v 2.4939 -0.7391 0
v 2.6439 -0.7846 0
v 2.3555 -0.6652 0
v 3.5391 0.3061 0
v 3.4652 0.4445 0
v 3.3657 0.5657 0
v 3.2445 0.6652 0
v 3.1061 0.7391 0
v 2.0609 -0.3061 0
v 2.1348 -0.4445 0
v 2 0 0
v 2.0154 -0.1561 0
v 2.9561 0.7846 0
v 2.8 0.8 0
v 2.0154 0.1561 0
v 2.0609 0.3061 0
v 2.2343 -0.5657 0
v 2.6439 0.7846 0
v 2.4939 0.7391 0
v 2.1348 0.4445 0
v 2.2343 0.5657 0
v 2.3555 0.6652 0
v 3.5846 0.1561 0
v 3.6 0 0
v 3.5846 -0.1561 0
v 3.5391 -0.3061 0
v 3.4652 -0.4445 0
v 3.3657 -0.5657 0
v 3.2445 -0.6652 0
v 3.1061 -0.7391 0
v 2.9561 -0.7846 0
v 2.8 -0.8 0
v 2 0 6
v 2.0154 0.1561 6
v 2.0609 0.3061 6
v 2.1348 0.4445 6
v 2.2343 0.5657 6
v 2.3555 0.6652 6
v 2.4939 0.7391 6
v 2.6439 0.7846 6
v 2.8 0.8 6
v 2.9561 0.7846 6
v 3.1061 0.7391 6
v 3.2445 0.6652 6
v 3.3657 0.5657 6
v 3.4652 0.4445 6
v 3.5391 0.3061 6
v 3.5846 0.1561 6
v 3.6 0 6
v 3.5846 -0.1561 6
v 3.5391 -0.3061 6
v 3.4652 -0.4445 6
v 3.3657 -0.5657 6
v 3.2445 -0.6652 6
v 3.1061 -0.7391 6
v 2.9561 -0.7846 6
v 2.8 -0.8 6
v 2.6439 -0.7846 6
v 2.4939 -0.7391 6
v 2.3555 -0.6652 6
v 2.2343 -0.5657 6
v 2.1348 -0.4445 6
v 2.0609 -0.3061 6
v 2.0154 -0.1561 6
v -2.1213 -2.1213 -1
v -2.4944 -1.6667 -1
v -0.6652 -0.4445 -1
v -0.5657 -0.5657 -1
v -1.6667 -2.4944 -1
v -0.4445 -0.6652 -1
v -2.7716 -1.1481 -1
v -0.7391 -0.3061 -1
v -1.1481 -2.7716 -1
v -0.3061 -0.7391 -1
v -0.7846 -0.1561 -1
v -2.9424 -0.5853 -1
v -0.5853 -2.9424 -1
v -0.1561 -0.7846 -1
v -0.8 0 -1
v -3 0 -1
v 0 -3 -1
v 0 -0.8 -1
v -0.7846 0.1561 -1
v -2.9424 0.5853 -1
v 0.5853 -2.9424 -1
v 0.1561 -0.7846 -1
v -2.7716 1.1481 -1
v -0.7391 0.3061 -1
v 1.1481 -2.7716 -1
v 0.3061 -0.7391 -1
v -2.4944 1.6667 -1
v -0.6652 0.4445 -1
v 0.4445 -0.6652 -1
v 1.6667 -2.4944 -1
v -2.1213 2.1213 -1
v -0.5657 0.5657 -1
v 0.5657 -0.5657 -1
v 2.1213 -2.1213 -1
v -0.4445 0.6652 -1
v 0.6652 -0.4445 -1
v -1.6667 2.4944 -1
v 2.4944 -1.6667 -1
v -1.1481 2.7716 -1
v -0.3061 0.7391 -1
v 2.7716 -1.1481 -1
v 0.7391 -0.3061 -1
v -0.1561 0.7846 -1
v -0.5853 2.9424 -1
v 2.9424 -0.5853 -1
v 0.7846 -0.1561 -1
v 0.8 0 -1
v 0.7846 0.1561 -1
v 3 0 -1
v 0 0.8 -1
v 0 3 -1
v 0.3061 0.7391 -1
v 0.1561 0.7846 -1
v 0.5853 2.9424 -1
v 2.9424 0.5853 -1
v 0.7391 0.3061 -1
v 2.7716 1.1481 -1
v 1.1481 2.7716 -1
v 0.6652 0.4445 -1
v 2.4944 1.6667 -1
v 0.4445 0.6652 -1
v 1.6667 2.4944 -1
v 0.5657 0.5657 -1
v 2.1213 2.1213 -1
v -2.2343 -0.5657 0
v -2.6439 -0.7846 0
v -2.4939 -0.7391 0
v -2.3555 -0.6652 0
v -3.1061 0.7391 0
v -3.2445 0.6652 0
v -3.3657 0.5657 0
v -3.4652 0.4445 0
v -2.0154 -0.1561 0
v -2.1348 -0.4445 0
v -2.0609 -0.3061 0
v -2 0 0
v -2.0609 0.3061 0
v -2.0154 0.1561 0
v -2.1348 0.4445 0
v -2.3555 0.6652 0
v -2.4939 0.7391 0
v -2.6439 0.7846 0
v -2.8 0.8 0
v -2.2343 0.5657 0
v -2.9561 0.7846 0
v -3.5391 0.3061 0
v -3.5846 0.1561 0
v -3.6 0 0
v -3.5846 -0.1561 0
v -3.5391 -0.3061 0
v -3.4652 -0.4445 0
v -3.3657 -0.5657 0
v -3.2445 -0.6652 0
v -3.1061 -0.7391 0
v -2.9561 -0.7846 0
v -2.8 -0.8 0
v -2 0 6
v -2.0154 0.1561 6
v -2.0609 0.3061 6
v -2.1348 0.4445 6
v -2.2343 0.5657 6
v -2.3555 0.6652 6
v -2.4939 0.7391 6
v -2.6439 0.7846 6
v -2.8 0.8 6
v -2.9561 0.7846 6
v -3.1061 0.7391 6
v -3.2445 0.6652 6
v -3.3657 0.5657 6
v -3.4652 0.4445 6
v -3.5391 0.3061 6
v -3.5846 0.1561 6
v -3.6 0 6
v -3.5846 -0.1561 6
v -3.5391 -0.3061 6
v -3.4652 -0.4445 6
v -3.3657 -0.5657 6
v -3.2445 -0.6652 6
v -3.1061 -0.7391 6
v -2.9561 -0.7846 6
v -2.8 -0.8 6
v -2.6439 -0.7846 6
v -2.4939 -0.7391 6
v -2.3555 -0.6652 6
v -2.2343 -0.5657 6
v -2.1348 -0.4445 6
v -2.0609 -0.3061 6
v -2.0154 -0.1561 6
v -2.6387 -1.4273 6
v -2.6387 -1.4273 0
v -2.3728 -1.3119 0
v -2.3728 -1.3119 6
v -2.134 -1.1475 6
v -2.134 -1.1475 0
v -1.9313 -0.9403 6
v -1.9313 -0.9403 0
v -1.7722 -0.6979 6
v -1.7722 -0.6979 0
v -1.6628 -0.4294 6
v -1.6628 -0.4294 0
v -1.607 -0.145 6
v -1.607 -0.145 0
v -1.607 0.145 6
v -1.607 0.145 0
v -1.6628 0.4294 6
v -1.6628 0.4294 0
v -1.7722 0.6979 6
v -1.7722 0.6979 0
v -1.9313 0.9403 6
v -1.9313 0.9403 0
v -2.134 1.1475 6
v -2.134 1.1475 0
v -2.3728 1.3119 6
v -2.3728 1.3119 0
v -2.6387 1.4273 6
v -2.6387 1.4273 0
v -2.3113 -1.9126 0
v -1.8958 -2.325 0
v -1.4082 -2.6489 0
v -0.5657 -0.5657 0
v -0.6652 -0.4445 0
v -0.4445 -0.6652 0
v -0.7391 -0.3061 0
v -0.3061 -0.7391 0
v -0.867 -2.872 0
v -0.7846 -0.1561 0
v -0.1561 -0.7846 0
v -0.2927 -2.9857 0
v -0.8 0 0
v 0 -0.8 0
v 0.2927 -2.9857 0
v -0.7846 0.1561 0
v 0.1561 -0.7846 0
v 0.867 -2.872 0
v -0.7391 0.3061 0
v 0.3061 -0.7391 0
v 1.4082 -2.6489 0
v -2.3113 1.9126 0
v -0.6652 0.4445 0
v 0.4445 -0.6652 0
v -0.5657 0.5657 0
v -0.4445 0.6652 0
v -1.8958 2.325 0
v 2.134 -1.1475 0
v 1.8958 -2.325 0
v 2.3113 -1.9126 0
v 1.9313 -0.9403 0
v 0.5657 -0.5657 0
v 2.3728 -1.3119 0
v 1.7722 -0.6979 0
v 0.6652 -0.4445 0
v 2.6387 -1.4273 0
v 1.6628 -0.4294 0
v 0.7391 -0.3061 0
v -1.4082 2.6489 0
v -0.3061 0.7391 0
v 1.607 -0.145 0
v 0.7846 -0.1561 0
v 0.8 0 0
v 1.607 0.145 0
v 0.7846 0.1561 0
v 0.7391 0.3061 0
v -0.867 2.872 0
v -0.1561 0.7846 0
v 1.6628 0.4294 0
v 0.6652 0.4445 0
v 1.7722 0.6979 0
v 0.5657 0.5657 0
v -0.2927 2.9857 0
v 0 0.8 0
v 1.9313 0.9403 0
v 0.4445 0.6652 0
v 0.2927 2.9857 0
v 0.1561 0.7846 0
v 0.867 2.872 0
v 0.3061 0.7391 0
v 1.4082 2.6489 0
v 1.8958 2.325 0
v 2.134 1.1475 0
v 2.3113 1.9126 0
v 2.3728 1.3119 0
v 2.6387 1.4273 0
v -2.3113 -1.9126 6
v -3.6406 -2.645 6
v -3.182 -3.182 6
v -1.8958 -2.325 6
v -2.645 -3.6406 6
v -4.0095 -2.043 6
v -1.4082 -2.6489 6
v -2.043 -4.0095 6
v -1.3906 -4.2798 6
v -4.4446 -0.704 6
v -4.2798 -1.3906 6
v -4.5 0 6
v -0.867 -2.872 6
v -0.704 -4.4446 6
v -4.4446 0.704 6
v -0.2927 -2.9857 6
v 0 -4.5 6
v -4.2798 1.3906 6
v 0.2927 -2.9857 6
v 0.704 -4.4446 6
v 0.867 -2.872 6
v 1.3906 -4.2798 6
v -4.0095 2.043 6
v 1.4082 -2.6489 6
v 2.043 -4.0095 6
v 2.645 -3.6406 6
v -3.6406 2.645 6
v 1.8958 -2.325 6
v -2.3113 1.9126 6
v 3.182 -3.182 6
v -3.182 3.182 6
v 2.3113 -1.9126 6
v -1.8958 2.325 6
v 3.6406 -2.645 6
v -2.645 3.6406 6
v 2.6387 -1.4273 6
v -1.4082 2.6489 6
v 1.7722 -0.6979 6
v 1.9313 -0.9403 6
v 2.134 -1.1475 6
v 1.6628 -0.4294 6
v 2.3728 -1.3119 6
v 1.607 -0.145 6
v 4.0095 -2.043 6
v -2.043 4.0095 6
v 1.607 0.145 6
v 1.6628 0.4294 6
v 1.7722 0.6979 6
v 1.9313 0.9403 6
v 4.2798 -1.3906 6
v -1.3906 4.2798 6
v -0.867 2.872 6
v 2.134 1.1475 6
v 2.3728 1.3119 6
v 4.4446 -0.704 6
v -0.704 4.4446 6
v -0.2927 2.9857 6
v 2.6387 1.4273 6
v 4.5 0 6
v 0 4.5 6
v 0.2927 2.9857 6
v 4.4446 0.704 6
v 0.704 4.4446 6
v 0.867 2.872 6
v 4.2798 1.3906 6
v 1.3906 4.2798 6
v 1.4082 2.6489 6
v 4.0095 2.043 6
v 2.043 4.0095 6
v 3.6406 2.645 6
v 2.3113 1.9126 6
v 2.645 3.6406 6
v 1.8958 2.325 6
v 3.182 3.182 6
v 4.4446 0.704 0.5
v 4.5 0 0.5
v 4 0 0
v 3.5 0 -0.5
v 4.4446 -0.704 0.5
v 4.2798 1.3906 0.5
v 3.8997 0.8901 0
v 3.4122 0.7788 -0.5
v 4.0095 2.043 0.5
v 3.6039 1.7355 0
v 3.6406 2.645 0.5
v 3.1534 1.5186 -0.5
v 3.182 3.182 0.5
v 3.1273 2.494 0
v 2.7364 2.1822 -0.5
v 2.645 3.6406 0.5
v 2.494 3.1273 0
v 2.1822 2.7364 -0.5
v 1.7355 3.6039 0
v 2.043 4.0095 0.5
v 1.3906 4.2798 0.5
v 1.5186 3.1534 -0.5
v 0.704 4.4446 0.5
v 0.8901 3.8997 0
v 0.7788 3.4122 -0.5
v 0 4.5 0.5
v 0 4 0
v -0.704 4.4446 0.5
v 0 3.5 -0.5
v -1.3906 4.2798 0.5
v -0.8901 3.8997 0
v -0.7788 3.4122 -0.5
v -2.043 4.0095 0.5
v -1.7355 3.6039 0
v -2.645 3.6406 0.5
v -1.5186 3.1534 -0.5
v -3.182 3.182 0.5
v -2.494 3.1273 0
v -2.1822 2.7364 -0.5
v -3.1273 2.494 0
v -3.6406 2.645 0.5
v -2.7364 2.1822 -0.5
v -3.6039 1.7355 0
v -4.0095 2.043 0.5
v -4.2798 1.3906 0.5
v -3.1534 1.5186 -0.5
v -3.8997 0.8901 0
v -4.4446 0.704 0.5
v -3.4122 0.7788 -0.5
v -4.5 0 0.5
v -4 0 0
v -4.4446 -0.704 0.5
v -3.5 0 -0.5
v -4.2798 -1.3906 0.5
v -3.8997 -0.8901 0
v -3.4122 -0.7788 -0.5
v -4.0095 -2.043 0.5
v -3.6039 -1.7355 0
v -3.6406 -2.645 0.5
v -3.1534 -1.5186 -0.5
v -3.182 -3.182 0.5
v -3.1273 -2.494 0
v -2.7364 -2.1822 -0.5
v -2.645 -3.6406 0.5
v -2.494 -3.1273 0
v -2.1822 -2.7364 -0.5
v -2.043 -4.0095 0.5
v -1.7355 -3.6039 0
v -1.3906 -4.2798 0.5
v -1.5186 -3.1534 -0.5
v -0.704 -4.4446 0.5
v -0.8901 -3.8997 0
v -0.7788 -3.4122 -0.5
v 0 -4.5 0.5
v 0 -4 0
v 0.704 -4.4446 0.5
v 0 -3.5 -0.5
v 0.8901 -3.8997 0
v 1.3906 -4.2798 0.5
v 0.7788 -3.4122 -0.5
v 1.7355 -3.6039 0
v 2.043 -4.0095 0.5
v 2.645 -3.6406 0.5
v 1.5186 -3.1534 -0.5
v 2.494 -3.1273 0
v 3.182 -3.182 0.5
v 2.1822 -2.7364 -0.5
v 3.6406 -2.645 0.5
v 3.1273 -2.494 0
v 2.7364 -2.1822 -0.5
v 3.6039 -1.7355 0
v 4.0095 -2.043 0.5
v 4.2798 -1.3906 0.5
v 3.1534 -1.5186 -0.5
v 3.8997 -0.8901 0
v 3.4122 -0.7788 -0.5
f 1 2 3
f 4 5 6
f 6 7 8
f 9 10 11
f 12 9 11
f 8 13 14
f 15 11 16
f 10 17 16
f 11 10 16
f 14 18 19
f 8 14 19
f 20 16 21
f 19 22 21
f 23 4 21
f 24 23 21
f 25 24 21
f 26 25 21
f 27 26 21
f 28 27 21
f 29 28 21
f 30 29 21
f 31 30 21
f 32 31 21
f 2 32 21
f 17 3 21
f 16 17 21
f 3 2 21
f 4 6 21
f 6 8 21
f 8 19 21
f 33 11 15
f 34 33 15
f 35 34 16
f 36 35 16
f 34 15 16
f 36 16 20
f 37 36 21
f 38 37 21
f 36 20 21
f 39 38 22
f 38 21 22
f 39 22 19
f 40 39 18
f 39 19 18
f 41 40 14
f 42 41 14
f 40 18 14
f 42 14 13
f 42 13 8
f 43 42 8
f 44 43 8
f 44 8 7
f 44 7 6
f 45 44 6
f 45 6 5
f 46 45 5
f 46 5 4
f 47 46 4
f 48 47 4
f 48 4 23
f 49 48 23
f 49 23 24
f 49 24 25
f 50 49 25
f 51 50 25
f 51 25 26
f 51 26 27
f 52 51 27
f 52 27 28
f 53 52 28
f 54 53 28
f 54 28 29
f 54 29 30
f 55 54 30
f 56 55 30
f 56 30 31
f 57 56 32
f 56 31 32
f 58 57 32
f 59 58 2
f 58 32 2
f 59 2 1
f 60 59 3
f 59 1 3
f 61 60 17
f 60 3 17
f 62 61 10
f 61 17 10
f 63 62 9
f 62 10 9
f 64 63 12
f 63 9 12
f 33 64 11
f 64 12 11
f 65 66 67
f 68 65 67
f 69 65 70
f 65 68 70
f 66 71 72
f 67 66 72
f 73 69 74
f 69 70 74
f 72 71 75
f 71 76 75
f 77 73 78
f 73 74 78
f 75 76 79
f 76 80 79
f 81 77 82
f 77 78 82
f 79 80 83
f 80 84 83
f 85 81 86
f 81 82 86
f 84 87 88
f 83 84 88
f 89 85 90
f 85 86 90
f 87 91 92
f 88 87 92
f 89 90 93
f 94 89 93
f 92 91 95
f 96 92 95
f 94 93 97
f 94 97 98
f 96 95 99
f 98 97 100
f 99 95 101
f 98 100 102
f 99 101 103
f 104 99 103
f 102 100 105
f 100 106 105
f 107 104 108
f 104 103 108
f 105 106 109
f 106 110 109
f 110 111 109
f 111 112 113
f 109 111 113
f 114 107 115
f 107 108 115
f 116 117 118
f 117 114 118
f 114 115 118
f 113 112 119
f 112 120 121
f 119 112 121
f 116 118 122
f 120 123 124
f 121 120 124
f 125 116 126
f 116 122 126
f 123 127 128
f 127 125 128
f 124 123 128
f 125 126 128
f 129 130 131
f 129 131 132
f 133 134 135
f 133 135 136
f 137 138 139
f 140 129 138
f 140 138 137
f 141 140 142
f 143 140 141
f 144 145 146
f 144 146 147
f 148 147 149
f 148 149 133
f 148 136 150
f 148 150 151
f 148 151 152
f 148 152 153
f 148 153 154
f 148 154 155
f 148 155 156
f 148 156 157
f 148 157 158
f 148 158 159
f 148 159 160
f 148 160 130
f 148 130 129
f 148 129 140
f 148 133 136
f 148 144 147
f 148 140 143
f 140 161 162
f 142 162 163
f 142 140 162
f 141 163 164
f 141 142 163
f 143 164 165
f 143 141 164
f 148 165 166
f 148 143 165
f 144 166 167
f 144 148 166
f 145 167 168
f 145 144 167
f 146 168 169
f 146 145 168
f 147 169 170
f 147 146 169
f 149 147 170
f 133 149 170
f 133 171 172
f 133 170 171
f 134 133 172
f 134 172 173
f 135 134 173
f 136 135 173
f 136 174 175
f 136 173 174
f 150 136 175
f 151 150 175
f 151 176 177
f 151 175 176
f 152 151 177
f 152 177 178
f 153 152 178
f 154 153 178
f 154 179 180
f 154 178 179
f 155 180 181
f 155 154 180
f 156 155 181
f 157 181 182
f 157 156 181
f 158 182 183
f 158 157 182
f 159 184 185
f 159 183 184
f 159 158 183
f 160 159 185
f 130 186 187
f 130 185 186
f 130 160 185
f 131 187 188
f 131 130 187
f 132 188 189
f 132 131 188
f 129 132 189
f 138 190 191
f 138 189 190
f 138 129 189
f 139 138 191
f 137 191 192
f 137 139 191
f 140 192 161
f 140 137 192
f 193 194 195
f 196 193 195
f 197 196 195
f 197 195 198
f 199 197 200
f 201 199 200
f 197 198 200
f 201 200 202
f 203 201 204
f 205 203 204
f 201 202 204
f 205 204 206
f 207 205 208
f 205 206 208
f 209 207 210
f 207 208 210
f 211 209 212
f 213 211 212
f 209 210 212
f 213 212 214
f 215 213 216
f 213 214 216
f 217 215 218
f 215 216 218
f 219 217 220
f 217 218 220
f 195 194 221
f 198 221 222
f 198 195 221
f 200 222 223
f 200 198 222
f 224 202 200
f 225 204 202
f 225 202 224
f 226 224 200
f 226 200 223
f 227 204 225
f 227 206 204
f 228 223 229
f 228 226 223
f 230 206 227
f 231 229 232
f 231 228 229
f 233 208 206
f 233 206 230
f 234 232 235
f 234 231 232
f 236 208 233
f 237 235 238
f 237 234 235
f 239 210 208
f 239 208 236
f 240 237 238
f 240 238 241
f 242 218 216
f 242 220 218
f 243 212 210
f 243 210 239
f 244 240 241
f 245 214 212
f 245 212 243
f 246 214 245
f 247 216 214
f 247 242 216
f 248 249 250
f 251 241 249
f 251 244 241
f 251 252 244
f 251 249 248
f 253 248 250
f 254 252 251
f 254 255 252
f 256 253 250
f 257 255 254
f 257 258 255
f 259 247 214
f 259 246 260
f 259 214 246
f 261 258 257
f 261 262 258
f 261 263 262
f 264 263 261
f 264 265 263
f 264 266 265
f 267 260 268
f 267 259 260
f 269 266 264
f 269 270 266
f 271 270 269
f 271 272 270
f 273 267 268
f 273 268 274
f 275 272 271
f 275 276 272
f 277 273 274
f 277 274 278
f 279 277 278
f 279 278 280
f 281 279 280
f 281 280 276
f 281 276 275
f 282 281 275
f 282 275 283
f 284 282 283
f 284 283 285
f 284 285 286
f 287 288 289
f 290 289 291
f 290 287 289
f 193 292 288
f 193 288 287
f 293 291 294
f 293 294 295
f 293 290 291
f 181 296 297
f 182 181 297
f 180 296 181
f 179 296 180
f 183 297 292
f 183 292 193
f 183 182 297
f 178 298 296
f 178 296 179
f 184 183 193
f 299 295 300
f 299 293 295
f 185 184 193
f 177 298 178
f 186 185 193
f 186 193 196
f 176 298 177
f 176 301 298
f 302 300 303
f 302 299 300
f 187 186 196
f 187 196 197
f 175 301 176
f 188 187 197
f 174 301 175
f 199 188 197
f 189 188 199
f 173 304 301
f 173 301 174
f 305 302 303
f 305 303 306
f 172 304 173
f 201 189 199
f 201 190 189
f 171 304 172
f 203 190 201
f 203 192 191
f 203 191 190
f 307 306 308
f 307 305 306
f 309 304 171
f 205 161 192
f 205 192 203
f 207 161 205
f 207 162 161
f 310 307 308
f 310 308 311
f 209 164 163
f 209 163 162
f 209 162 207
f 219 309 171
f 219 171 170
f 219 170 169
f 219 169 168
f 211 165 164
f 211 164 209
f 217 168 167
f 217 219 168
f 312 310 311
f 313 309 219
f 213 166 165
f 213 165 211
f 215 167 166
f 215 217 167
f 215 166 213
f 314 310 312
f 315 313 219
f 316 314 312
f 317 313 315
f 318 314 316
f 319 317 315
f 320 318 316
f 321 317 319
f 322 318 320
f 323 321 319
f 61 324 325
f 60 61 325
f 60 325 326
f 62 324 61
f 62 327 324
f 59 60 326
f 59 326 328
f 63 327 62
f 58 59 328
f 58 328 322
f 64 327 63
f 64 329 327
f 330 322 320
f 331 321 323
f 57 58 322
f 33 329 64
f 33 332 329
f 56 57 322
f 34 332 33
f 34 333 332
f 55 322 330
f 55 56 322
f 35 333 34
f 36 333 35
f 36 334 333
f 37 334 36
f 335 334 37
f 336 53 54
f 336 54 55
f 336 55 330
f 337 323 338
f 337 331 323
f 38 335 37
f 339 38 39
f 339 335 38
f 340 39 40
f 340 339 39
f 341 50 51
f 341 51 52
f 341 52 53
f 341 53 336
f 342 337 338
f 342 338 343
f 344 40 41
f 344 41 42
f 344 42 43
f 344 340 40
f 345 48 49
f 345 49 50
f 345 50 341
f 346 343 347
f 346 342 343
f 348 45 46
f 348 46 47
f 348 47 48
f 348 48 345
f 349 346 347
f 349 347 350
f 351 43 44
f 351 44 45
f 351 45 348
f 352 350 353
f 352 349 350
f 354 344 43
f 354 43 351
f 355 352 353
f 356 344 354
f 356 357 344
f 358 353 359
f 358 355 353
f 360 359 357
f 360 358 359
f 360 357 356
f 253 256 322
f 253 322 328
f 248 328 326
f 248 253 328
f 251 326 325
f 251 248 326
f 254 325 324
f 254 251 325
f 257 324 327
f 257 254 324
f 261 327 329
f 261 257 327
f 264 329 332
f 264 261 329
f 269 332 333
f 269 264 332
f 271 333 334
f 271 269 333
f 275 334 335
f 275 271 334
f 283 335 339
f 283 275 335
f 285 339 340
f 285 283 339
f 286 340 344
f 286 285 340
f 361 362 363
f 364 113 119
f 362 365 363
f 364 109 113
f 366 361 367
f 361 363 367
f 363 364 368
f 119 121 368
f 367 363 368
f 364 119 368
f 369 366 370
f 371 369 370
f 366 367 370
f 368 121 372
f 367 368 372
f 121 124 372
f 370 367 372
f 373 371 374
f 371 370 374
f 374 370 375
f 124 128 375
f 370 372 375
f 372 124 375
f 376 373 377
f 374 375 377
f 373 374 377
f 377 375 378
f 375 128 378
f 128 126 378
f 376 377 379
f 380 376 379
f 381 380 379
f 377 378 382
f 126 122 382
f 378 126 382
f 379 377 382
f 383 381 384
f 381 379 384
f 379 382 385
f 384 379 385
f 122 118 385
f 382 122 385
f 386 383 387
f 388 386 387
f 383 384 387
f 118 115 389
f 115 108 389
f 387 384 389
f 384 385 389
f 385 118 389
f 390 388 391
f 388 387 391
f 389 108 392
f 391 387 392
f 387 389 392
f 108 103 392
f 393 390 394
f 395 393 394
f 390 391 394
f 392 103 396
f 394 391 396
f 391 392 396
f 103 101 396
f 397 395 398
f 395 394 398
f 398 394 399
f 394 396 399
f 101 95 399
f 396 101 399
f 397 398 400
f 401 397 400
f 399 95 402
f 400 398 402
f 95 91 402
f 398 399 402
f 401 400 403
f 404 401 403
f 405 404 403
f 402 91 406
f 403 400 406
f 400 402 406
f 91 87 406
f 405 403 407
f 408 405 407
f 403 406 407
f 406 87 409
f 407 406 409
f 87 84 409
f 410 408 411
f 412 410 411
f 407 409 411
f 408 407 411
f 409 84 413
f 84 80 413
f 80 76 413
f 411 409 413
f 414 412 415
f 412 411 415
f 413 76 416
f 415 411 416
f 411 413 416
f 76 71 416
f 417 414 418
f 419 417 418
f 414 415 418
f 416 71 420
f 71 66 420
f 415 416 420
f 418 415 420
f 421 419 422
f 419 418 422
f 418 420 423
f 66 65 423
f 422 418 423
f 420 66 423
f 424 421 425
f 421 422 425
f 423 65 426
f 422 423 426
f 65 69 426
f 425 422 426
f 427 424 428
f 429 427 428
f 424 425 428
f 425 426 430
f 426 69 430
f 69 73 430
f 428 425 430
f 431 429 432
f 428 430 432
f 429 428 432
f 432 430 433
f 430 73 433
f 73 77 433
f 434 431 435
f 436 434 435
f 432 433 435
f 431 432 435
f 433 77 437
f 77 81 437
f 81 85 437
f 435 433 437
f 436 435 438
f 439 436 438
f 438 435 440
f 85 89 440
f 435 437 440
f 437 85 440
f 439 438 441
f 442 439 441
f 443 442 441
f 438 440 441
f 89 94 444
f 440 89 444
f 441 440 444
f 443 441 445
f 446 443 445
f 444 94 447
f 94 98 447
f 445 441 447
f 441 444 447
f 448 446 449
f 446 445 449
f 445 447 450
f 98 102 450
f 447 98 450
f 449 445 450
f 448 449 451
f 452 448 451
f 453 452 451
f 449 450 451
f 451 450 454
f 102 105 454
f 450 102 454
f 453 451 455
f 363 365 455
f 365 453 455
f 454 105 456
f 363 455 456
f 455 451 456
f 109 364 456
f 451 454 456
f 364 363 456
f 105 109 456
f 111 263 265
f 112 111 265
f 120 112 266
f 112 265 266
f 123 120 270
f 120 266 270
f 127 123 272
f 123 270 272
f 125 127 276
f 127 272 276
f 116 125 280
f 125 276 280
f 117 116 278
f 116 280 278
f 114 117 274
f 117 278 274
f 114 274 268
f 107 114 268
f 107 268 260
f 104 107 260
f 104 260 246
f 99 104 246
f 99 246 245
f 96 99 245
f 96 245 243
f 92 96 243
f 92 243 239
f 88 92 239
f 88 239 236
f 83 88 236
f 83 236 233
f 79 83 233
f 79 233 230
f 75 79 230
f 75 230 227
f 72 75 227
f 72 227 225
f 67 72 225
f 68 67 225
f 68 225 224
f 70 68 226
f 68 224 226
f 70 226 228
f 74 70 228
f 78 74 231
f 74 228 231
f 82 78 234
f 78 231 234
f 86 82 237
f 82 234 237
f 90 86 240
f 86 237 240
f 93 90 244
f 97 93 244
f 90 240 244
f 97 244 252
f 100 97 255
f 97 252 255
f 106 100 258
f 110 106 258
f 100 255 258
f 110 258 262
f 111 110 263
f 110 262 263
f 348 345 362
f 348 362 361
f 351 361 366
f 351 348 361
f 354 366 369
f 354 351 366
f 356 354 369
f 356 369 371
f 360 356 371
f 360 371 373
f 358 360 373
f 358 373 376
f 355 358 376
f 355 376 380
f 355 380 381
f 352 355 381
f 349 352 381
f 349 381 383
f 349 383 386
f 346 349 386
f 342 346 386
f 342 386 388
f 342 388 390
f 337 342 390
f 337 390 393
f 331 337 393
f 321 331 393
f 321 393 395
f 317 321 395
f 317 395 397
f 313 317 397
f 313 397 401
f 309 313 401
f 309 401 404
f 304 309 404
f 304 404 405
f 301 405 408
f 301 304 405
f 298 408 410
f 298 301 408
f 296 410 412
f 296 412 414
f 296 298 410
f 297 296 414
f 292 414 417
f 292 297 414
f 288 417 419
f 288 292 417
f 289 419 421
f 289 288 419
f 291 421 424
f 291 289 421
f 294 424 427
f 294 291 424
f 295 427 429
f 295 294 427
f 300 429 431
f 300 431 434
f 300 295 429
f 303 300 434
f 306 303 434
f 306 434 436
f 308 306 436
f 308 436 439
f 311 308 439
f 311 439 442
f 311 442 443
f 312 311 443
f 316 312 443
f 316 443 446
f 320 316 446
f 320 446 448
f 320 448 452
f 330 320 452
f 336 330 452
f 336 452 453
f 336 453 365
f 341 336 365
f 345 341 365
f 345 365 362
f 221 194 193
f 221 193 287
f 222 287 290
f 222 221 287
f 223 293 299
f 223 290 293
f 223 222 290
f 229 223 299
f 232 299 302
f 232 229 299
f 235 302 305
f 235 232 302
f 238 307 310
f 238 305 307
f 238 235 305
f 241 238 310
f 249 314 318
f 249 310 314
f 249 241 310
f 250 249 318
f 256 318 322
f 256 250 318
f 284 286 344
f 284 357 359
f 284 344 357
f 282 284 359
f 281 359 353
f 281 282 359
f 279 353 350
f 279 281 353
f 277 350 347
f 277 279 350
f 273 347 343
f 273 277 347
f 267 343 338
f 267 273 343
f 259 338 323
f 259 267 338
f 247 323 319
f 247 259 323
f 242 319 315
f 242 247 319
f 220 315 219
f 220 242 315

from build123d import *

# Parameters (mm, degrees)
SKETCH006_R       = 4.5
PAD002_DEPTH      = 6
PAD002_DEPTH_BACK = 1
SKETCH007_R       = 3
POCKET008_DEPTH   = 6
SKETCH008_R       = 0.8
HOLE_DEPTH        = 25
PAD005_DEPTH      = 6
SKETCH010_R       = 0.8
POCKET005_DEPTH   = 7
CHAMFER_SIZE      = 1.5


with BuildPart() as part:
    # Sketch006 → Pad002 (new body, two sides)
    with BuildSketch(Plane.XY) as pad002_sk:
        Circle(SKETCH006_R)
    extrude(amount=PAD002_DEPTH)
    extrude(pad002_sk.sketch, amount=-PAD002_DEPTH_BACK)

    # Sketch007 → Pocket008 (cut)
    with BuildSketch(Plane.XY):
        Circle(SKETCH007_R)
    extrude(amount=POCKET008_DEPTH, mode=Mode.SUBTRACT)

    # Sketch008 → Hole (cut)
    with BuildSketch(Plane.XY):
        Circle(SKETCH008_R)
    extrude(amount=-HOLE_DEPTH, mode=Mode.SUBTRACT)

    # Sketch009 → Pad005 (join)
    with BuildSketch(Plane.XY):
        with BuildLine():
            ThreePointArc((-3.1, -1.5), (-1.6, 0), (-3.1, 1.5))
            Line((-3.1, 1.5), (-3.708099, 1.5))
            ThreePointArc((-3.708099, 1.5), (-4, 0), (-3.708099, -1.5))
            Line((-3.1, -1.5), (-3.708099, -1.5))
        make_face()
    pad005 = extrude(amount=PAD005_DEPTH)

    # Sketch010 → Pocket005 (cut)
    with BuildSketch(Plane.XY):
        with Locations((-2.8, 0)):
            Circle(SKETCH010_R)
    pocket005 = extrude(amount=POCKET005_DEPTH, mode=Mode.SUBTRACT)

    # Mirrored005: Pad005, Pocket005 across Sketch009 V_Axis
    add(pad005.mirror(Plane(origin=(0, 0, 0), x_dir=(0, 0, 1), z_dir=(1, 0, 0))))
    add(pocket005.mirror(Plane(origin=(0, 0, 0), x_dir=(0, 0, 1), z_dir=(1, 0, 0))), mode=Mode.SUBTRACT)

    # Chamfer
    chamfer_edges = [part.edges().sort_by_distance(p)[0] for p in [
        (-4.5, 0, -1),
    ]]
    chamfer(chamfer_edges, length=CHAMFER_SIZE)


solid = part.part
